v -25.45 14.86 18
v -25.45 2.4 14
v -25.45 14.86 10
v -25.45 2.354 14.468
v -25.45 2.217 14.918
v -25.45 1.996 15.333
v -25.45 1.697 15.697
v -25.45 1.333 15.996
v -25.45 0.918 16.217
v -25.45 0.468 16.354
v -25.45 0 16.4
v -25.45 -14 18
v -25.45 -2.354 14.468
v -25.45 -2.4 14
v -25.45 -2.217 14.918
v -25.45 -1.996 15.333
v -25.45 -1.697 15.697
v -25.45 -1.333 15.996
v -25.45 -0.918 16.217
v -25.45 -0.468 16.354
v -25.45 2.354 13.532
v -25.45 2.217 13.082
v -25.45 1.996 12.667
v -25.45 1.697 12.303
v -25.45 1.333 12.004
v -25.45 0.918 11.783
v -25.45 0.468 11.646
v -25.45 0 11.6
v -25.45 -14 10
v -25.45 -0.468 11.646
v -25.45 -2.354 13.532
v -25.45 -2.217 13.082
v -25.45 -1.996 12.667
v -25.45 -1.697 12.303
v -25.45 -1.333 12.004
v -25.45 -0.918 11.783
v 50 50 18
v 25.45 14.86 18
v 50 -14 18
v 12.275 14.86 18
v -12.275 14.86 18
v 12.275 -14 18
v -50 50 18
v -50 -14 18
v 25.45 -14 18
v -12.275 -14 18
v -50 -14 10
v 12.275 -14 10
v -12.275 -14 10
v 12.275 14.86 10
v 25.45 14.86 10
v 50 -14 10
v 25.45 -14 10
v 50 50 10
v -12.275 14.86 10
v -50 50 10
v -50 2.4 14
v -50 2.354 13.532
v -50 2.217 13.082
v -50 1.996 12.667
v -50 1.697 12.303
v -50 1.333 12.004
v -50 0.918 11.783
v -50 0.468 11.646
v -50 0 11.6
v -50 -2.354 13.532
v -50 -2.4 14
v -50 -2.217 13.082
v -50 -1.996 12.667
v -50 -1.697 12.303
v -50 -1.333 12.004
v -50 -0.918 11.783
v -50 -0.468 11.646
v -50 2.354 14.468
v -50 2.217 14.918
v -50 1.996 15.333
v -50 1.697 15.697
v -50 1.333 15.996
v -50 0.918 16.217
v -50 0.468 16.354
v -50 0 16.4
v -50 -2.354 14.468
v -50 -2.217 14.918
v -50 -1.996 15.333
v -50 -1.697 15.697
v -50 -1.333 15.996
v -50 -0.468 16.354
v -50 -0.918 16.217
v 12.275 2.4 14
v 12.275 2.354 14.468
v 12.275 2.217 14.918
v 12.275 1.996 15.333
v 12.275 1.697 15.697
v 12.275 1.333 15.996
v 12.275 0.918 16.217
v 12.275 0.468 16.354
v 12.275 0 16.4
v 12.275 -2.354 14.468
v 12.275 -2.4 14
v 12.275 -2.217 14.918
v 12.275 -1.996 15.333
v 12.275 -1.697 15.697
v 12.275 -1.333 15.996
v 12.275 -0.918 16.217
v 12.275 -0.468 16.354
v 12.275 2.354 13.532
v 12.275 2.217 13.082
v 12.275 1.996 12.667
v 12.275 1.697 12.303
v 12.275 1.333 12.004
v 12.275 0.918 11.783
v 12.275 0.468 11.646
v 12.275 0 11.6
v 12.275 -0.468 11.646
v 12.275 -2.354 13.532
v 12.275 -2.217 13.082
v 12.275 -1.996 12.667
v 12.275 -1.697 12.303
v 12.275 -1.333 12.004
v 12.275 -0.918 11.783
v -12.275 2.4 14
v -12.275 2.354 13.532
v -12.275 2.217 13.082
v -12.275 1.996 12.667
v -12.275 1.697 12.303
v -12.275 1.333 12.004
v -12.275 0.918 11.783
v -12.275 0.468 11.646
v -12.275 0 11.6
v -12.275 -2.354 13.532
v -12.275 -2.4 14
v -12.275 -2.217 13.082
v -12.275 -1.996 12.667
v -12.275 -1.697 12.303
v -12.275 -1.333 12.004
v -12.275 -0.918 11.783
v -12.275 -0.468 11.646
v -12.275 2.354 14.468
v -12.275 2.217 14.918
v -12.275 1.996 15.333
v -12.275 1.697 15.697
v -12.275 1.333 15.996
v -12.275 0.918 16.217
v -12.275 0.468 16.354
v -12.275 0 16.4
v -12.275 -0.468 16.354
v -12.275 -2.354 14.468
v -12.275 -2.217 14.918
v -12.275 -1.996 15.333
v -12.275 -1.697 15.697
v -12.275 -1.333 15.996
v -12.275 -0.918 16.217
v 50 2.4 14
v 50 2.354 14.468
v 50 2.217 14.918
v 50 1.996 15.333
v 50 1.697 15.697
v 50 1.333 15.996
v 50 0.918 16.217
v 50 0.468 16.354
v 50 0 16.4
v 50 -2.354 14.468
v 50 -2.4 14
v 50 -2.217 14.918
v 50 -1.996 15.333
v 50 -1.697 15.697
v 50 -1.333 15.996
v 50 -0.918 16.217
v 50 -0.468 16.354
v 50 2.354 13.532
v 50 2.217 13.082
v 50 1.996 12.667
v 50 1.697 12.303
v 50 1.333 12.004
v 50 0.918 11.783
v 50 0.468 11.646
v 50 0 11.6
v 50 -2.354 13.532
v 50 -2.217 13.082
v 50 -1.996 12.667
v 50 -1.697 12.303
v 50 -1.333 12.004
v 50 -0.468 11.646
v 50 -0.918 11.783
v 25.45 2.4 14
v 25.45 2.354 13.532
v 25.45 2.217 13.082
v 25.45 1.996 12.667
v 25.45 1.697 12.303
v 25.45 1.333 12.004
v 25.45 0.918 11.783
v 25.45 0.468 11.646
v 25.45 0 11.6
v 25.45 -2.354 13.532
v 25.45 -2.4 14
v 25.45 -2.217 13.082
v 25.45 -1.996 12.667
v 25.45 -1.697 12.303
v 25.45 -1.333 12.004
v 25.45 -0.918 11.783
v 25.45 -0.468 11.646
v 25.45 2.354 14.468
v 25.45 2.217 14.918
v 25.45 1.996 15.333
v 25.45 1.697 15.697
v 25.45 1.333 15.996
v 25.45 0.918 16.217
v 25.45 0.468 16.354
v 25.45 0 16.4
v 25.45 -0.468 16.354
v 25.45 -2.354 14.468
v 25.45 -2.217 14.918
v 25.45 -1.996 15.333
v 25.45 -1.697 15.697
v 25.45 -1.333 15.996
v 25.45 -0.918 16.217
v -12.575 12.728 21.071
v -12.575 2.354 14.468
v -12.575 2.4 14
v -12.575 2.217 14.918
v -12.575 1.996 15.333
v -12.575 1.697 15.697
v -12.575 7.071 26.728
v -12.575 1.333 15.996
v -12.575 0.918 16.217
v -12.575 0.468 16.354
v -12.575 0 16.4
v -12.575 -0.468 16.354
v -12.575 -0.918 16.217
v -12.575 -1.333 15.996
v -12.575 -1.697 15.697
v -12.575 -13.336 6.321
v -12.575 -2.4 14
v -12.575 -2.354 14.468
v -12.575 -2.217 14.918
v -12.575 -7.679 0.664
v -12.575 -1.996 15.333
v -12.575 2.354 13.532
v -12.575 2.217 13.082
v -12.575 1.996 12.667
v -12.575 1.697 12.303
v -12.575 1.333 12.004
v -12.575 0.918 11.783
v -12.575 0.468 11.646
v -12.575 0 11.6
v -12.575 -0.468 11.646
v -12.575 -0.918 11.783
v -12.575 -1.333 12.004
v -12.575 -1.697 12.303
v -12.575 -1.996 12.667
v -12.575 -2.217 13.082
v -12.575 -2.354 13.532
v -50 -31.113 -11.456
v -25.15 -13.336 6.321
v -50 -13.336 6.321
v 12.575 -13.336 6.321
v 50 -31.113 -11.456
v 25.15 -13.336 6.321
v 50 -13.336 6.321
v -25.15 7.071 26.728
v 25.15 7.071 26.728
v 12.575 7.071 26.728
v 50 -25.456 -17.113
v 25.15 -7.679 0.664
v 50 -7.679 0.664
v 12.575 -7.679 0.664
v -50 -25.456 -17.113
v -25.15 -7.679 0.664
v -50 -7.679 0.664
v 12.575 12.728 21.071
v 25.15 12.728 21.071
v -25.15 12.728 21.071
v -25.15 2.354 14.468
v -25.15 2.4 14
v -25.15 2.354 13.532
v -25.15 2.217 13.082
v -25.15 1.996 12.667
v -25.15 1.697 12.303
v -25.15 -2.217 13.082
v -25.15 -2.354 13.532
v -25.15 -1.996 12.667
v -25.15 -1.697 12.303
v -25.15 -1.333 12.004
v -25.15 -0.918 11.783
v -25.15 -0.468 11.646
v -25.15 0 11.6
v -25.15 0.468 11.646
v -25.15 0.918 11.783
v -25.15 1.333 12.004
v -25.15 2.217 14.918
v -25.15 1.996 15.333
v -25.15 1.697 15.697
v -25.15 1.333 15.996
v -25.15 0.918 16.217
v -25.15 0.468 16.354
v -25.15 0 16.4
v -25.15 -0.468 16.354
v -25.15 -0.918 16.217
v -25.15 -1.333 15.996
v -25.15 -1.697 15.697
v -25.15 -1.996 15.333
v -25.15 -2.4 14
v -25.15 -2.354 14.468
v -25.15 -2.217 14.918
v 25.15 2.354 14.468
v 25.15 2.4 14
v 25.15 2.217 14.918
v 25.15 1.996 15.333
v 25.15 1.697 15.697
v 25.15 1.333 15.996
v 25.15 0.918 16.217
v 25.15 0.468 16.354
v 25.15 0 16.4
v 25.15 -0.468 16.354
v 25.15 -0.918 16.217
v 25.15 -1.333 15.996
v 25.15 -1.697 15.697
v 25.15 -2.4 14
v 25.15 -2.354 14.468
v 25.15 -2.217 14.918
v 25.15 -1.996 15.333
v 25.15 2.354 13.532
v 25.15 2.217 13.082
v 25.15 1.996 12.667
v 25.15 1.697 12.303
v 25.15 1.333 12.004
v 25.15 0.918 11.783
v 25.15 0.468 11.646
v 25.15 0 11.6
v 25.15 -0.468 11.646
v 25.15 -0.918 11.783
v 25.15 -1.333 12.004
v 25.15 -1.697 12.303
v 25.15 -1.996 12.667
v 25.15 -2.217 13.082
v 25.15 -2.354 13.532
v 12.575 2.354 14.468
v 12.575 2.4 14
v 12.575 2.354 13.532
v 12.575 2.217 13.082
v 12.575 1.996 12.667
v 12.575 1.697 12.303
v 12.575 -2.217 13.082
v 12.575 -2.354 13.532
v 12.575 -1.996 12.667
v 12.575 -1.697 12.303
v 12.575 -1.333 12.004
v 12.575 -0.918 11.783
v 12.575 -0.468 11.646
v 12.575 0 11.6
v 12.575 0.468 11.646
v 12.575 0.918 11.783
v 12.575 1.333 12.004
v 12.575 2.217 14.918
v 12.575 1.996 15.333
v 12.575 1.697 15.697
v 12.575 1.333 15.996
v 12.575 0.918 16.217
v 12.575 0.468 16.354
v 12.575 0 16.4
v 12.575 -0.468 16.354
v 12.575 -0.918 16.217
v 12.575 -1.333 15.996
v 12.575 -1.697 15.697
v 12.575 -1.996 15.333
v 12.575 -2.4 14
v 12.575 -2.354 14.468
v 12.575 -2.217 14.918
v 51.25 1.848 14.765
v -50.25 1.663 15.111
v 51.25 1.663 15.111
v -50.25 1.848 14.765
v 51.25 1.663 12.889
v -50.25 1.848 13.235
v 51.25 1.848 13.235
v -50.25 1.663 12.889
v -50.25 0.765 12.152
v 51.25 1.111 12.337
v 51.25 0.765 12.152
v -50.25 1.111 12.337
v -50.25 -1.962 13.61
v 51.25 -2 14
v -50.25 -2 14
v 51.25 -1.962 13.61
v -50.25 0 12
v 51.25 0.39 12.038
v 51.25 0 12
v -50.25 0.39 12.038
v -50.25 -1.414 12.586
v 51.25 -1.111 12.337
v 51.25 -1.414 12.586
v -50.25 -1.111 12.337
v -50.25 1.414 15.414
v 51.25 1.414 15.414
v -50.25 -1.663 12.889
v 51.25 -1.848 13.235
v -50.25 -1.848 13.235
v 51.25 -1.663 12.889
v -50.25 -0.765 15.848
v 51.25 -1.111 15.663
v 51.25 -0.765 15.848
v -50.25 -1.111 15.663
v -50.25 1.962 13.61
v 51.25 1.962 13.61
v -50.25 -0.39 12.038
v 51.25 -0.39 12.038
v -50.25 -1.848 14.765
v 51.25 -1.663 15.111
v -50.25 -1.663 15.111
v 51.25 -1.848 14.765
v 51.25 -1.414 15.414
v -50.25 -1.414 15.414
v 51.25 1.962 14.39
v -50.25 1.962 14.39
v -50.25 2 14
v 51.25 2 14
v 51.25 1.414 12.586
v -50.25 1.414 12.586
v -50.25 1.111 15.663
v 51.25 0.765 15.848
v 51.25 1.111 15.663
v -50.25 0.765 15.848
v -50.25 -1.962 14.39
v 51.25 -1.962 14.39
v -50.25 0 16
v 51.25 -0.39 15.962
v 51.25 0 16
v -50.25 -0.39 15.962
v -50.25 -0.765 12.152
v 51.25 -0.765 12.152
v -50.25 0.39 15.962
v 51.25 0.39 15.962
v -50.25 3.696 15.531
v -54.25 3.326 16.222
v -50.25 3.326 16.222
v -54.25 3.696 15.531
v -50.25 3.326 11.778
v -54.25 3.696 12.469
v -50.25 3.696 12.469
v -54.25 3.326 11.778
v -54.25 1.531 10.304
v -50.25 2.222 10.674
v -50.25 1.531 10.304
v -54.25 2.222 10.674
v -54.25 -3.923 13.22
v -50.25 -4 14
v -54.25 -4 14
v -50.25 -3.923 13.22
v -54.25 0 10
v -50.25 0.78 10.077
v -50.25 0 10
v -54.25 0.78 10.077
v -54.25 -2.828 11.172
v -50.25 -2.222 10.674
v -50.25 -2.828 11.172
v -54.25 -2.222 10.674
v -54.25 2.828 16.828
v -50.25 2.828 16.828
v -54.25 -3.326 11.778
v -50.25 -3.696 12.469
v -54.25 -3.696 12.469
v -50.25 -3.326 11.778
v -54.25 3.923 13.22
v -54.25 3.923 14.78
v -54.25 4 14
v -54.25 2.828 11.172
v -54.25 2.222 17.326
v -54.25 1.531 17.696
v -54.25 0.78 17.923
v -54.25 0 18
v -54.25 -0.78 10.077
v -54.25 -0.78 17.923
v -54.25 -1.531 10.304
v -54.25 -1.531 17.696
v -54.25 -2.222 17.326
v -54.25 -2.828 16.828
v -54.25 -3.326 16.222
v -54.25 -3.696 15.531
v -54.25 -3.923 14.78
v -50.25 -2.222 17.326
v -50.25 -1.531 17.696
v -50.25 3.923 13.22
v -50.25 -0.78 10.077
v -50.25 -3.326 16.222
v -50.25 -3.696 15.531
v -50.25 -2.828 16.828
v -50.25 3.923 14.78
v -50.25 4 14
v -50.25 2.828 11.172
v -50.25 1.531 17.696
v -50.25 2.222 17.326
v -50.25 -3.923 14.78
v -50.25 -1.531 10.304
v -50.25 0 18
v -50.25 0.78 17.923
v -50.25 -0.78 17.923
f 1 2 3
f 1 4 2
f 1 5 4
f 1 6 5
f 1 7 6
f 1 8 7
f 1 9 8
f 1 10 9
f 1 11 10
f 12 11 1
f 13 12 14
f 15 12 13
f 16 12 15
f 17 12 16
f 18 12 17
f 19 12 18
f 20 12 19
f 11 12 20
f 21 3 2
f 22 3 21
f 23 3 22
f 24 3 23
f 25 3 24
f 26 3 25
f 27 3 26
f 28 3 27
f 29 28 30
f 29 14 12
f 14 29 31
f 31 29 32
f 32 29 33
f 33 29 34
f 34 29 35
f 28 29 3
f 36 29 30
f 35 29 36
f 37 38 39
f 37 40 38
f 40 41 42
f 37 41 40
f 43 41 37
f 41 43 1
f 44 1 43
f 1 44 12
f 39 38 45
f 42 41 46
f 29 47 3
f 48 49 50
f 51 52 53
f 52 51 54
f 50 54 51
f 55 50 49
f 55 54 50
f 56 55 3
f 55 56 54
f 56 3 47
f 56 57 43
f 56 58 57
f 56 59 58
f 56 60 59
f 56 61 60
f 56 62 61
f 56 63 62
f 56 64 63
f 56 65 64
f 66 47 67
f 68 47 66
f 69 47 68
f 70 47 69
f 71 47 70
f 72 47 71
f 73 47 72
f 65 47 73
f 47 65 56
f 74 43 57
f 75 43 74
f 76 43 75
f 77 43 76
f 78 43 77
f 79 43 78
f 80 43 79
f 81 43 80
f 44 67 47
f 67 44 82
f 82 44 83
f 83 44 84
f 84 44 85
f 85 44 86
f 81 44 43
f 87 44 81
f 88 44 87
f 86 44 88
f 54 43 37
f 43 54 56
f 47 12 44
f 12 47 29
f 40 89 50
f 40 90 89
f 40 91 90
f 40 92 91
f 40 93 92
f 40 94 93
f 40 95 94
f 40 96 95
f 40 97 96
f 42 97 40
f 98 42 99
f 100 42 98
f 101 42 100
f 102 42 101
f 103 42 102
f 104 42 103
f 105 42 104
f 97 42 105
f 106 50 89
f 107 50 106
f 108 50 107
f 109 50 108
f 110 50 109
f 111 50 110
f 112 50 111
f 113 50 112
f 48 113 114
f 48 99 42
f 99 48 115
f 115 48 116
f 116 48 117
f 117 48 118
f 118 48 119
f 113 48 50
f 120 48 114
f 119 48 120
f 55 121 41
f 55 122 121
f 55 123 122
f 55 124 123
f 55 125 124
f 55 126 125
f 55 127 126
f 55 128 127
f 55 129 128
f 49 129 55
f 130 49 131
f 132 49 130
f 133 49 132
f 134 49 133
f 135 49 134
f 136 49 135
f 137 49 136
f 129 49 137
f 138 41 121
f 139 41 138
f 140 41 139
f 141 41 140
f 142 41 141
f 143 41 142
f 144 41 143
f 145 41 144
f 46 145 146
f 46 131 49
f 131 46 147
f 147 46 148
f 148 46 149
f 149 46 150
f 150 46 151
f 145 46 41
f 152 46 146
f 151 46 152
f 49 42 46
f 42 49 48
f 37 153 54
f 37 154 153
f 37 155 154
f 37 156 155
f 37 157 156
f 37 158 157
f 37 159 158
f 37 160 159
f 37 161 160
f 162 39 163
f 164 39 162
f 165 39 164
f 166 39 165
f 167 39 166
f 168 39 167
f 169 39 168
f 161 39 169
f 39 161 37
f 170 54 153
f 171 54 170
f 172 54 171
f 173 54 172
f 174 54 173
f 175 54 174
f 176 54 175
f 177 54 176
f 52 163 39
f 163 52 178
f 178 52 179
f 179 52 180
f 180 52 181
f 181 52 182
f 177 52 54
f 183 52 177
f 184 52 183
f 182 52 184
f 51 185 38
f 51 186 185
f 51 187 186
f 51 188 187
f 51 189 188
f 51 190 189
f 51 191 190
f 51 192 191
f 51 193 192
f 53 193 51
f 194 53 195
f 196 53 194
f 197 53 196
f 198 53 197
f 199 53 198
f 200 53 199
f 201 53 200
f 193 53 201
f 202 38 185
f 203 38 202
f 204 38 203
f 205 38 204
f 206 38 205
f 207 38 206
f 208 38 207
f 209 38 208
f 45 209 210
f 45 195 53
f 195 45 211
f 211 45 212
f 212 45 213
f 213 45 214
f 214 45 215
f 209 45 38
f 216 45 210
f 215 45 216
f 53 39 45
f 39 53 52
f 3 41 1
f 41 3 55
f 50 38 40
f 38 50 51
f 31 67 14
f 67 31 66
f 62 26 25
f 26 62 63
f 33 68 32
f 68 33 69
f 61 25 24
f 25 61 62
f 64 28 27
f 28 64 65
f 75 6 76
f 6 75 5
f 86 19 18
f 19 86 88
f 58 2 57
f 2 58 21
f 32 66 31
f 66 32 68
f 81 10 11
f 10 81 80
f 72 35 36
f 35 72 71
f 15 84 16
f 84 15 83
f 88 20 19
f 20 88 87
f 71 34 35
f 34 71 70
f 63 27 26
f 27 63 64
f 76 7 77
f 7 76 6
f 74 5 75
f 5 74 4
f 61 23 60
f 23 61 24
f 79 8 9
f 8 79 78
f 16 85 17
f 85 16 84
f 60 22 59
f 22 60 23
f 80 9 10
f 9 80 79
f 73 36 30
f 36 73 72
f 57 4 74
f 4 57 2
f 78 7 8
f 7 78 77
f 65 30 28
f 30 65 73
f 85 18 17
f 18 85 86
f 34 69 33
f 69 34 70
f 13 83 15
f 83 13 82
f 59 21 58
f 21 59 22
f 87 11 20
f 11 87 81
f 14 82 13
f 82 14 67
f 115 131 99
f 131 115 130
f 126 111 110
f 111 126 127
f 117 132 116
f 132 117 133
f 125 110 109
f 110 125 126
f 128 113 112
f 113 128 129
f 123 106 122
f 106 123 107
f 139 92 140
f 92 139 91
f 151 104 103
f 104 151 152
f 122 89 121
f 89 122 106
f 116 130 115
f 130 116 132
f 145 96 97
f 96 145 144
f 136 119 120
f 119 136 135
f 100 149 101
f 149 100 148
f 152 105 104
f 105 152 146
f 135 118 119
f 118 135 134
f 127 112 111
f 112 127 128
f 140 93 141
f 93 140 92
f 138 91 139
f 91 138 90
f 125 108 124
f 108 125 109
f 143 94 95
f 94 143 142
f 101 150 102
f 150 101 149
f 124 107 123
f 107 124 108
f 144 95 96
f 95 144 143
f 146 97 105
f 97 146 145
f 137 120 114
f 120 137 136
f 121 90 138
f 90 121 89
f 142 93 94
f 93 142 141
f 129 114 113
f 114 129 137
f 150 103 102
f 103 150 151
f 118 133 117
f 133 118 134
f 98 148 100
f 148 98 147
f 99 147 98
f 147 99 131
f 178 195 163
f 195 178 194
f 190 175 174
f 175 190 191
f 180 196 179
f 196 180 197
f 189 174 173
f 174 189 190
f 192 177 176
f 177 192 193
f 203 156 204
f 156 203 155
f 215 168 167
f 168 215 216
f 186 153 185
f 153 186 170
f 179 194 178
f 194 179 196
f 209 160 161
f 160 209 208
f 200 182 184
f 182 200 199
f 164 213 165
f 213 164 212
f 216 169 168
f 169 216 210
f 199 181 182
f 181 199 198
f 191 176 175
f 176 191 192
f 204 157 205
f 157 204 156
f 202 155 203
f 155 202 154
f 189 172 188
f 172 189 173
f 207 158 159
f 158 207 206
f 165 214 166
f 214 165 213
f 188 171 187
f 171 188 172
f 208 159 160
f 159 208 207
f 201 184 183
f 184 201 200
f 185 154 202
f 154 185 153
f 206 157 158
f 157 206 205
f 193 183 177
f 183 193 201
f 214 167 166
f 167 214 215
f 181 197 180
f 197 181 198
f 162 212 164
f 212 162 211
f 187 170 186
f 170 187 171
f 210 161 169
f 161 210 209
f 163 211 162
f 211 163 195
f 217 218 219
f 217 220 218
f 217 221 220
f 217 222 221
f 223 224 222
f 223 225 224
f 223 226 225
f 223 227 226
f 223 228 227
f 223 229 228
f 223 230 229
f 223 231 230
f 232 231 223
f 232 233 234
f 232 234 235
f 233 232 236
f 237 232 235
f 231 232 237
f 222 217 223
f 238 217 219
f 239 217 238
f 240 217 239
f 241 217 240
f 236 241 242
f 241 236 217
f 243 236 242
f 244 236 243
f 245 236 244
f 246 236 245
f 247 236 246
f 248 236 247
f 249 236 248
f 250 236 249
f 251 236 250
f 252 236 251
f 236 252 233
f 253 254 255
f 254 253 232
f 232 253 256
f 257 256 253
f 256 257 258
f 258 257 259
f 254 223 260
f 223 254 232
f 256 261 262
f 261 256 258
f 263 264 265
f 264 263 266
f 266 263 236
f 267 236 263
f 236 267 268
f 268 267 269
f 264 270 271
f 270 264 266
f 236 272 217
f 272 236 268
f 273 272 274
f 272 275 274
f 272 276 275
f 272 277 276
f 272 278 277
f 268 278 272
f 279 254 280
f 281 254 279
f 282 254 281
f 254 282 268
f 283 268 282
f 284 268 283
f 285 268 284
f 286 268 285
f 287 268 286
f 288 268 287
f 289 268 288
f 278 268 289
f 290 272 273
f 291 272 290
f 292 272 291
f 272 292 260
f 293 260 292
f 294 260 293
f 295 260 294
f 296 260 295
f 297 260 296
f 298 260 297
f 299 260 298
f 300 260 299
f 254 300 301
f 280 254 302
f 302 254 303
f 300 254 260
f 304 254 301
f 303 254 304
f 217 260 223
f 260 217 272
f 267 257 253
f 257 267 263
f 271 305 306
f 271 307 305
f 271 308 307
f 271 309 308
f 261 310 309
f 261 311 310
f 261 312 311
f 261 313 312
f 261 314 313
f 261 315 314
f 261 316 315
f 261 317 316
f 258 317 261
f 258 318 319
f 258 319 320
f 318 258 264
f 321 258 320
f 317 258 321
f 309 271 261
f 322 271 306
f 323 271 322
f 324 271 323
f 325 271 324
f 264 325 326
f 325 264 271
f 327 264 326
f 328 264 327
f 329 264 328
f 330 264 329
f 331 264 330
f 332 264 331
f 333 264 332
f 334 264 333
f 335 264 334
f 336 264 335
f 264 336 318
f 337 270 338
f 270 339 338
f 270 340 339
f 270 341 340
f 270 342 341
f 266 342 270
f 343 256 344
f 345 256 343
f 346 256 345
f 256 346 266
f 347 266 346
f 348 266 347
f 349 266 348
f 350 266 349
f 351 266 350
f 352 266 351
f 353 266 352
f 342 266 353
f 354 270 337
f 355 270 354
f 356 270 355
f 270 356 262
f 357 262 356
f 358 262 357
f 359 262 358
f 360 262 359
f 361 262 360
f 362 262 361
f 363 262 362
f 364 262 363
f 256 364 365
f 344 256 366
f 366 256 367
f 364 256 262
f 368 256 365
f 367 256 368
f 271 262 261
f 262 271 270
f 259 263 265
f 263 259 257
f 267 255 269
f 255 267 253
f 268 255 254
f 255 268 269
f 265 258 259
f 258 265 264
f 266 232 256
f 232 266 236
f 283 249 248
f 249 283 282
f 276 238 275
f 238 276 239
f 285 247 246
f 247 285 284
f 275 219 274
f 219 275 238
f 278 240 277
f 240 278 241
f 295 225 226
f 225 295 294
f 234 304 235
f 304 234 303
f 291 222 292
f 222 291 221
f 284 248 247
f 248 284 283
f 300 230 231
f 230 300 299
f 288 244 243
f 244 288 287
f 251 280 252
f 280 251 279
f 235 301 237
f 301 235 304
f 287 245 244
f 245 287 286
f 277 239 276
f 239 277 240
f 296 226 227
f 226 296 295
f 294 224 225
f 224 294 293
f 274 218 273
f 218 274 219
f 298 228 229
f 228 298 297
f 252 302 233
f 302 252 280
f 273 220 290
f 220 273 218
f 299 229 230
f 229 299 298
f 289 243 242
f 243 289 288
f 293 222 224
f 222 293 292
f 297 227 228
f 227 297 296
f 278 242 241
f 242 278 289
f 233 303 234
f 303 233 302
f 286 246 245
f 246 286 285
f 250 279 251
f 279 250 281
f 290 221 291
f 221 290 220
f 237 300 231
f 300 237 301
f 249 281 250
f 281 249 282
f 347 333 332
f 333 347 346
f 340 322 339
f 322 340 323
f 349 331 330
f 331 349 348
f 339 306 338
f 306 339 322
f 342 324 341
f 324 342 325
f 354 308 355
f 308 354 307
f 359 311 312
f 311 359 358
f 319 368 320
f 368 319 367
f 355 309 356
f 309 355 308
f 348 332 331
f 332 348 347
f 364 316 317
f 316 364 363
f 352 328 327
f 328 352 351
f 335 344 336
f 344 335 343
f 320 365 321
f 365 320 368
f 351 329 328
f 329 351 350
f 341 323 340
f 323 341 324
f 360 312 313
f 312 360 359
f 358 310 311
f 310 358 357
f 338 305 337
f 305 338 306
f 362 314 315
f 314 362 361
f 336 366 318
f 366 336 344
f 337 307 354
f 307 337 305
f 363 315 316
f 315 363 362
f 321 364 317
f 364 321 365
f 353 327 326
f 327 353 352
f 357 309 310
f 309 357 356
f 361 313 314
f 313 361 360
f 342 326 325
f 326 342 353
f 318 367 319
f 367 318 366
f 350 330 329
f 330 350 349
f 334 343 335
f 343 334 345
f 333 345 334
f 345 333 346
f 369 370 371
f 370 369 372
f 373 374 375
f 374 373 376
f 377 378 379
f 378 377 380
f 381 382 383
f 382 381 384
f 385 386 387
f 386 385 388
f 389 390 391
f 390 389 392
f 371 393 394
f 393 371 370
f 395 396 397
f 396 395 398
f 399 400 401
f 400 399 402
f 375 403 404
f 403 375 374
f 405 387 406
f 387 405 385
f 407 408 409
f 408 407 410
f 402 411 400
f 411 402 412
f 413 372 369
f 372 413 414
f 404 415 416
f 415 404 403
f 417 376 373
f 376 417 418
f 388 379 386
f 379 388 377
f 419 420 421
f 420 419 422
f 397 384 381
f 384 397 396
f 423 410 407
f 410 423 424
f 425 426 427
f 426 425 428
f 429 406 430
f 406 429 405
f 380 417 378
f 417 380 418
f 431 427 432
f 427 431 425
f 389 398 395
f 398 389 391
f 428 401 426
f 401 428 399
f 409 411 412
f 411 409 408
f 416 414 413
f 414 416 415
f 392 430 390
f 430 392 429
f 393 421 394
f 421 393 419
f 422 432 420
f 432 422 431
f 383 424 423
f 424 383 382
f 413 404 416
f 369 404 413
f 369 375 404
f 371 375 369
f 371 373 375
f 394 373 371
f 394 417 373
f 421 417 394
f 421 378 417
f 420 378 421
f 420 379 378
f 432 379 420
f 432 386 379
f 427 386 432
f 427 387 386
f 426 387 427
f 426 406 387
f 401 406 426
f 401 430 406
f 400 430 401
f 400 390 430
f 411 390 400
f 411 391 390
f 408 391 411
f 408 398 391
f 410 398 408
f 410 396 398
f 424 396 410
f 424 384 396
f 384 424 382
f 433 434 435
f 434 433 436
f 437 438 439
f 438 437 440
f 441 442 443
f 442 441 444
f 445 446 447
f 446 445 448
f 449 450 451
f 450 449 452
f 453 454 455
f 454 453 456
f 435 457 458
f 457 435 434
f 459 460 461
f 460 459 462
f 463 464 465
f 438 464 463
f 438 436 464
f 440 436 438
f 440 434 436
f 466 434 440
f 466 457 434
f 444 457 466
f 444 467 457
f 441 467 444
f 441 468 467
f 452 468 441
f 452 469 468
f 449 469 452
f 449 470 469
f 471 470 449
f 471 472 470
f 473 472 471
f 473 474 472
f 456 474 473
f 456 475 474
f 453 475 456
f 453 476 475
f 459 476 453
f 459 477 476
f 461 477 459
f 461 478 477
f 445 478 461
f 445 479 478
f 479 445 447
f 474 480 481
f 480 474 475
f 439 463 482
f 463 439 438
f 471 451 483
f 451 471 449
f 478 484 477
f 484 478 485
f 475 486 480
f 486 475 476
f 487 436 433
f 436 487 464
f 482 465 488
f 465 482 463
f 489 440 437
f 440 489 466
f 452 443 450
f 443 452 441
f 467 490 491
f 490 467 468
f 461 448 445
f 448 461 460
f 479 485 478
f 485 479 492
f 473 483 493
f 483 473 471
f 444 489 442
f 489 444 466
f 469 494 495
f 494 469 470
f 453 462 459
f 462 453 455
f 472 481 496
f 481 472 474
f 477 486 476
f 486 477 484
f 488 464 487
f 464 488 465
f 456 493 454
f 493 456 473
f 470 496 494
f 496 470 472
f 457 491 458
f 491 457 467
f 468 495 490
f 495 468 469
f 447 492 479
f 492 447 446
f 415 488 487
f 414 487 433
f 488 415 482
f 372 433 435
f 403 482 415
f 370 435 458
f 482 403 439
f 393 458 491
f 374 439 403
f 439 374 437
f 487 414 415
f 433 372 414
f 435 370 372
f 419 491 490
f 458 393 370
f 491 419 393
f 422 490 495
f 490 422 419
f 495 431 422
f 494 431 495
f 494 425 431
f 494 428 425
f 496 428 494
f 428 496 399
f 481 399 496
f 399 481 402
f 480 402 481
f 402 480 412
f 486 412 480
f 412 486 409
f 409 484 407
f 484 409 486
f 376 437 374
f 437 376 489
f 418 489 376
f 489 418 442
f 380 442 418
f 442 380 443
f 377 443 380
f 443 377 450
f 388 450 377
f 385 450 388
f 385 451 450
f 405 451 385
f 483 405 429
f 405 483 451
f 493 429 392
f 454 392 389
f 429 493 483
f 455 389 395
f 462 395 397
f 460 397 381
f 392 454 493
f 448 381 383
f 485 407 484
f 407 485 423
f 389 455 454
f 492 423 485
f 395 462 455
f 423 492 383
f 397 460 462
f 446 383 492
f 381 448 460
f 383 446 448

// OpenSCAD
$fn = 32;

// ------------------------------------------------------------------------
// Butt hinge: hinge 100 mm, leaf swung 45 deg
// Every part is its own module, assembly() places every instance.
// ------------------------------------------------------------------------

// --- part 1 ---
module hinge_base() {
  difference() {
    union() {
      translate([-50, -14, -4]) cube([24.55, 64, 8]);
      translate([-12.275, -14, -4]) cube([24.55, 64, 8]);
      translate([25.45, -14, -4]) cube([24.55, 64, 8]);
      translate([-50, 14.86, -4]) cube([100, 35.14, 8]);
    }
    translate([-37.725, 0, 0]) rotate([0, 90, 0]) cylinder(h = 26.55, d = 4.8, center = true);
    translate([0, 0, 0]) rotate([0, 90, 0]) cylinder(h = 26.55, d = 4.8, center = true);
    translate([37.725, 0, 0]) rotate([0, 90, 0]) cylinder(h = 26.55, d = 4.8, center = true);
  }
}

// --- part 2 ---
module hinge_mover() {
  difference() {
    union() {
      translate([-25.15, -40, -4]) cube([12.575, 54, 8]);
      translate([12.575, -40, -4]) cube([12.575, 54, 8]);
      translate([-50, -40, -4]) cube([100, 25.14, 8]);
    }
    translate([-18.863, 0, 0]) rotate([0, 90, 0]) cylinder(h = 14.575, d = 4.8, center = true);
    translate([18.863, 0, 0]) rotate([0, 90, 0]) cylinder(h = 14.575, d = 4.8, center = true);
  }
}

// --- part 3 ---
module hinge_pin() {
  rotate([0, 90, 0]) cylinder(h = 102.5, d = 4, center = true);
  translate([-54.25, 0, 0]) rotate([0, 90, 0]) cylinder(h = 4, d = 8);
}

// --- assembly ---
module assembly() {
  color([0.80, 0.24, 0.20]) translate([0, 0, 14]) rotate([0, 0, 0]) hinge_base();
  color([0.20, 0.45, 0.75]) translate([0, 0, 14]) rotate([45, 0, 0]) hinge_mover();
  color([0.25, 0.62, 0.32]) translate([0, 0, 14]) rotate([0, 0, 0]) hinge_pin();
}

assembly();
